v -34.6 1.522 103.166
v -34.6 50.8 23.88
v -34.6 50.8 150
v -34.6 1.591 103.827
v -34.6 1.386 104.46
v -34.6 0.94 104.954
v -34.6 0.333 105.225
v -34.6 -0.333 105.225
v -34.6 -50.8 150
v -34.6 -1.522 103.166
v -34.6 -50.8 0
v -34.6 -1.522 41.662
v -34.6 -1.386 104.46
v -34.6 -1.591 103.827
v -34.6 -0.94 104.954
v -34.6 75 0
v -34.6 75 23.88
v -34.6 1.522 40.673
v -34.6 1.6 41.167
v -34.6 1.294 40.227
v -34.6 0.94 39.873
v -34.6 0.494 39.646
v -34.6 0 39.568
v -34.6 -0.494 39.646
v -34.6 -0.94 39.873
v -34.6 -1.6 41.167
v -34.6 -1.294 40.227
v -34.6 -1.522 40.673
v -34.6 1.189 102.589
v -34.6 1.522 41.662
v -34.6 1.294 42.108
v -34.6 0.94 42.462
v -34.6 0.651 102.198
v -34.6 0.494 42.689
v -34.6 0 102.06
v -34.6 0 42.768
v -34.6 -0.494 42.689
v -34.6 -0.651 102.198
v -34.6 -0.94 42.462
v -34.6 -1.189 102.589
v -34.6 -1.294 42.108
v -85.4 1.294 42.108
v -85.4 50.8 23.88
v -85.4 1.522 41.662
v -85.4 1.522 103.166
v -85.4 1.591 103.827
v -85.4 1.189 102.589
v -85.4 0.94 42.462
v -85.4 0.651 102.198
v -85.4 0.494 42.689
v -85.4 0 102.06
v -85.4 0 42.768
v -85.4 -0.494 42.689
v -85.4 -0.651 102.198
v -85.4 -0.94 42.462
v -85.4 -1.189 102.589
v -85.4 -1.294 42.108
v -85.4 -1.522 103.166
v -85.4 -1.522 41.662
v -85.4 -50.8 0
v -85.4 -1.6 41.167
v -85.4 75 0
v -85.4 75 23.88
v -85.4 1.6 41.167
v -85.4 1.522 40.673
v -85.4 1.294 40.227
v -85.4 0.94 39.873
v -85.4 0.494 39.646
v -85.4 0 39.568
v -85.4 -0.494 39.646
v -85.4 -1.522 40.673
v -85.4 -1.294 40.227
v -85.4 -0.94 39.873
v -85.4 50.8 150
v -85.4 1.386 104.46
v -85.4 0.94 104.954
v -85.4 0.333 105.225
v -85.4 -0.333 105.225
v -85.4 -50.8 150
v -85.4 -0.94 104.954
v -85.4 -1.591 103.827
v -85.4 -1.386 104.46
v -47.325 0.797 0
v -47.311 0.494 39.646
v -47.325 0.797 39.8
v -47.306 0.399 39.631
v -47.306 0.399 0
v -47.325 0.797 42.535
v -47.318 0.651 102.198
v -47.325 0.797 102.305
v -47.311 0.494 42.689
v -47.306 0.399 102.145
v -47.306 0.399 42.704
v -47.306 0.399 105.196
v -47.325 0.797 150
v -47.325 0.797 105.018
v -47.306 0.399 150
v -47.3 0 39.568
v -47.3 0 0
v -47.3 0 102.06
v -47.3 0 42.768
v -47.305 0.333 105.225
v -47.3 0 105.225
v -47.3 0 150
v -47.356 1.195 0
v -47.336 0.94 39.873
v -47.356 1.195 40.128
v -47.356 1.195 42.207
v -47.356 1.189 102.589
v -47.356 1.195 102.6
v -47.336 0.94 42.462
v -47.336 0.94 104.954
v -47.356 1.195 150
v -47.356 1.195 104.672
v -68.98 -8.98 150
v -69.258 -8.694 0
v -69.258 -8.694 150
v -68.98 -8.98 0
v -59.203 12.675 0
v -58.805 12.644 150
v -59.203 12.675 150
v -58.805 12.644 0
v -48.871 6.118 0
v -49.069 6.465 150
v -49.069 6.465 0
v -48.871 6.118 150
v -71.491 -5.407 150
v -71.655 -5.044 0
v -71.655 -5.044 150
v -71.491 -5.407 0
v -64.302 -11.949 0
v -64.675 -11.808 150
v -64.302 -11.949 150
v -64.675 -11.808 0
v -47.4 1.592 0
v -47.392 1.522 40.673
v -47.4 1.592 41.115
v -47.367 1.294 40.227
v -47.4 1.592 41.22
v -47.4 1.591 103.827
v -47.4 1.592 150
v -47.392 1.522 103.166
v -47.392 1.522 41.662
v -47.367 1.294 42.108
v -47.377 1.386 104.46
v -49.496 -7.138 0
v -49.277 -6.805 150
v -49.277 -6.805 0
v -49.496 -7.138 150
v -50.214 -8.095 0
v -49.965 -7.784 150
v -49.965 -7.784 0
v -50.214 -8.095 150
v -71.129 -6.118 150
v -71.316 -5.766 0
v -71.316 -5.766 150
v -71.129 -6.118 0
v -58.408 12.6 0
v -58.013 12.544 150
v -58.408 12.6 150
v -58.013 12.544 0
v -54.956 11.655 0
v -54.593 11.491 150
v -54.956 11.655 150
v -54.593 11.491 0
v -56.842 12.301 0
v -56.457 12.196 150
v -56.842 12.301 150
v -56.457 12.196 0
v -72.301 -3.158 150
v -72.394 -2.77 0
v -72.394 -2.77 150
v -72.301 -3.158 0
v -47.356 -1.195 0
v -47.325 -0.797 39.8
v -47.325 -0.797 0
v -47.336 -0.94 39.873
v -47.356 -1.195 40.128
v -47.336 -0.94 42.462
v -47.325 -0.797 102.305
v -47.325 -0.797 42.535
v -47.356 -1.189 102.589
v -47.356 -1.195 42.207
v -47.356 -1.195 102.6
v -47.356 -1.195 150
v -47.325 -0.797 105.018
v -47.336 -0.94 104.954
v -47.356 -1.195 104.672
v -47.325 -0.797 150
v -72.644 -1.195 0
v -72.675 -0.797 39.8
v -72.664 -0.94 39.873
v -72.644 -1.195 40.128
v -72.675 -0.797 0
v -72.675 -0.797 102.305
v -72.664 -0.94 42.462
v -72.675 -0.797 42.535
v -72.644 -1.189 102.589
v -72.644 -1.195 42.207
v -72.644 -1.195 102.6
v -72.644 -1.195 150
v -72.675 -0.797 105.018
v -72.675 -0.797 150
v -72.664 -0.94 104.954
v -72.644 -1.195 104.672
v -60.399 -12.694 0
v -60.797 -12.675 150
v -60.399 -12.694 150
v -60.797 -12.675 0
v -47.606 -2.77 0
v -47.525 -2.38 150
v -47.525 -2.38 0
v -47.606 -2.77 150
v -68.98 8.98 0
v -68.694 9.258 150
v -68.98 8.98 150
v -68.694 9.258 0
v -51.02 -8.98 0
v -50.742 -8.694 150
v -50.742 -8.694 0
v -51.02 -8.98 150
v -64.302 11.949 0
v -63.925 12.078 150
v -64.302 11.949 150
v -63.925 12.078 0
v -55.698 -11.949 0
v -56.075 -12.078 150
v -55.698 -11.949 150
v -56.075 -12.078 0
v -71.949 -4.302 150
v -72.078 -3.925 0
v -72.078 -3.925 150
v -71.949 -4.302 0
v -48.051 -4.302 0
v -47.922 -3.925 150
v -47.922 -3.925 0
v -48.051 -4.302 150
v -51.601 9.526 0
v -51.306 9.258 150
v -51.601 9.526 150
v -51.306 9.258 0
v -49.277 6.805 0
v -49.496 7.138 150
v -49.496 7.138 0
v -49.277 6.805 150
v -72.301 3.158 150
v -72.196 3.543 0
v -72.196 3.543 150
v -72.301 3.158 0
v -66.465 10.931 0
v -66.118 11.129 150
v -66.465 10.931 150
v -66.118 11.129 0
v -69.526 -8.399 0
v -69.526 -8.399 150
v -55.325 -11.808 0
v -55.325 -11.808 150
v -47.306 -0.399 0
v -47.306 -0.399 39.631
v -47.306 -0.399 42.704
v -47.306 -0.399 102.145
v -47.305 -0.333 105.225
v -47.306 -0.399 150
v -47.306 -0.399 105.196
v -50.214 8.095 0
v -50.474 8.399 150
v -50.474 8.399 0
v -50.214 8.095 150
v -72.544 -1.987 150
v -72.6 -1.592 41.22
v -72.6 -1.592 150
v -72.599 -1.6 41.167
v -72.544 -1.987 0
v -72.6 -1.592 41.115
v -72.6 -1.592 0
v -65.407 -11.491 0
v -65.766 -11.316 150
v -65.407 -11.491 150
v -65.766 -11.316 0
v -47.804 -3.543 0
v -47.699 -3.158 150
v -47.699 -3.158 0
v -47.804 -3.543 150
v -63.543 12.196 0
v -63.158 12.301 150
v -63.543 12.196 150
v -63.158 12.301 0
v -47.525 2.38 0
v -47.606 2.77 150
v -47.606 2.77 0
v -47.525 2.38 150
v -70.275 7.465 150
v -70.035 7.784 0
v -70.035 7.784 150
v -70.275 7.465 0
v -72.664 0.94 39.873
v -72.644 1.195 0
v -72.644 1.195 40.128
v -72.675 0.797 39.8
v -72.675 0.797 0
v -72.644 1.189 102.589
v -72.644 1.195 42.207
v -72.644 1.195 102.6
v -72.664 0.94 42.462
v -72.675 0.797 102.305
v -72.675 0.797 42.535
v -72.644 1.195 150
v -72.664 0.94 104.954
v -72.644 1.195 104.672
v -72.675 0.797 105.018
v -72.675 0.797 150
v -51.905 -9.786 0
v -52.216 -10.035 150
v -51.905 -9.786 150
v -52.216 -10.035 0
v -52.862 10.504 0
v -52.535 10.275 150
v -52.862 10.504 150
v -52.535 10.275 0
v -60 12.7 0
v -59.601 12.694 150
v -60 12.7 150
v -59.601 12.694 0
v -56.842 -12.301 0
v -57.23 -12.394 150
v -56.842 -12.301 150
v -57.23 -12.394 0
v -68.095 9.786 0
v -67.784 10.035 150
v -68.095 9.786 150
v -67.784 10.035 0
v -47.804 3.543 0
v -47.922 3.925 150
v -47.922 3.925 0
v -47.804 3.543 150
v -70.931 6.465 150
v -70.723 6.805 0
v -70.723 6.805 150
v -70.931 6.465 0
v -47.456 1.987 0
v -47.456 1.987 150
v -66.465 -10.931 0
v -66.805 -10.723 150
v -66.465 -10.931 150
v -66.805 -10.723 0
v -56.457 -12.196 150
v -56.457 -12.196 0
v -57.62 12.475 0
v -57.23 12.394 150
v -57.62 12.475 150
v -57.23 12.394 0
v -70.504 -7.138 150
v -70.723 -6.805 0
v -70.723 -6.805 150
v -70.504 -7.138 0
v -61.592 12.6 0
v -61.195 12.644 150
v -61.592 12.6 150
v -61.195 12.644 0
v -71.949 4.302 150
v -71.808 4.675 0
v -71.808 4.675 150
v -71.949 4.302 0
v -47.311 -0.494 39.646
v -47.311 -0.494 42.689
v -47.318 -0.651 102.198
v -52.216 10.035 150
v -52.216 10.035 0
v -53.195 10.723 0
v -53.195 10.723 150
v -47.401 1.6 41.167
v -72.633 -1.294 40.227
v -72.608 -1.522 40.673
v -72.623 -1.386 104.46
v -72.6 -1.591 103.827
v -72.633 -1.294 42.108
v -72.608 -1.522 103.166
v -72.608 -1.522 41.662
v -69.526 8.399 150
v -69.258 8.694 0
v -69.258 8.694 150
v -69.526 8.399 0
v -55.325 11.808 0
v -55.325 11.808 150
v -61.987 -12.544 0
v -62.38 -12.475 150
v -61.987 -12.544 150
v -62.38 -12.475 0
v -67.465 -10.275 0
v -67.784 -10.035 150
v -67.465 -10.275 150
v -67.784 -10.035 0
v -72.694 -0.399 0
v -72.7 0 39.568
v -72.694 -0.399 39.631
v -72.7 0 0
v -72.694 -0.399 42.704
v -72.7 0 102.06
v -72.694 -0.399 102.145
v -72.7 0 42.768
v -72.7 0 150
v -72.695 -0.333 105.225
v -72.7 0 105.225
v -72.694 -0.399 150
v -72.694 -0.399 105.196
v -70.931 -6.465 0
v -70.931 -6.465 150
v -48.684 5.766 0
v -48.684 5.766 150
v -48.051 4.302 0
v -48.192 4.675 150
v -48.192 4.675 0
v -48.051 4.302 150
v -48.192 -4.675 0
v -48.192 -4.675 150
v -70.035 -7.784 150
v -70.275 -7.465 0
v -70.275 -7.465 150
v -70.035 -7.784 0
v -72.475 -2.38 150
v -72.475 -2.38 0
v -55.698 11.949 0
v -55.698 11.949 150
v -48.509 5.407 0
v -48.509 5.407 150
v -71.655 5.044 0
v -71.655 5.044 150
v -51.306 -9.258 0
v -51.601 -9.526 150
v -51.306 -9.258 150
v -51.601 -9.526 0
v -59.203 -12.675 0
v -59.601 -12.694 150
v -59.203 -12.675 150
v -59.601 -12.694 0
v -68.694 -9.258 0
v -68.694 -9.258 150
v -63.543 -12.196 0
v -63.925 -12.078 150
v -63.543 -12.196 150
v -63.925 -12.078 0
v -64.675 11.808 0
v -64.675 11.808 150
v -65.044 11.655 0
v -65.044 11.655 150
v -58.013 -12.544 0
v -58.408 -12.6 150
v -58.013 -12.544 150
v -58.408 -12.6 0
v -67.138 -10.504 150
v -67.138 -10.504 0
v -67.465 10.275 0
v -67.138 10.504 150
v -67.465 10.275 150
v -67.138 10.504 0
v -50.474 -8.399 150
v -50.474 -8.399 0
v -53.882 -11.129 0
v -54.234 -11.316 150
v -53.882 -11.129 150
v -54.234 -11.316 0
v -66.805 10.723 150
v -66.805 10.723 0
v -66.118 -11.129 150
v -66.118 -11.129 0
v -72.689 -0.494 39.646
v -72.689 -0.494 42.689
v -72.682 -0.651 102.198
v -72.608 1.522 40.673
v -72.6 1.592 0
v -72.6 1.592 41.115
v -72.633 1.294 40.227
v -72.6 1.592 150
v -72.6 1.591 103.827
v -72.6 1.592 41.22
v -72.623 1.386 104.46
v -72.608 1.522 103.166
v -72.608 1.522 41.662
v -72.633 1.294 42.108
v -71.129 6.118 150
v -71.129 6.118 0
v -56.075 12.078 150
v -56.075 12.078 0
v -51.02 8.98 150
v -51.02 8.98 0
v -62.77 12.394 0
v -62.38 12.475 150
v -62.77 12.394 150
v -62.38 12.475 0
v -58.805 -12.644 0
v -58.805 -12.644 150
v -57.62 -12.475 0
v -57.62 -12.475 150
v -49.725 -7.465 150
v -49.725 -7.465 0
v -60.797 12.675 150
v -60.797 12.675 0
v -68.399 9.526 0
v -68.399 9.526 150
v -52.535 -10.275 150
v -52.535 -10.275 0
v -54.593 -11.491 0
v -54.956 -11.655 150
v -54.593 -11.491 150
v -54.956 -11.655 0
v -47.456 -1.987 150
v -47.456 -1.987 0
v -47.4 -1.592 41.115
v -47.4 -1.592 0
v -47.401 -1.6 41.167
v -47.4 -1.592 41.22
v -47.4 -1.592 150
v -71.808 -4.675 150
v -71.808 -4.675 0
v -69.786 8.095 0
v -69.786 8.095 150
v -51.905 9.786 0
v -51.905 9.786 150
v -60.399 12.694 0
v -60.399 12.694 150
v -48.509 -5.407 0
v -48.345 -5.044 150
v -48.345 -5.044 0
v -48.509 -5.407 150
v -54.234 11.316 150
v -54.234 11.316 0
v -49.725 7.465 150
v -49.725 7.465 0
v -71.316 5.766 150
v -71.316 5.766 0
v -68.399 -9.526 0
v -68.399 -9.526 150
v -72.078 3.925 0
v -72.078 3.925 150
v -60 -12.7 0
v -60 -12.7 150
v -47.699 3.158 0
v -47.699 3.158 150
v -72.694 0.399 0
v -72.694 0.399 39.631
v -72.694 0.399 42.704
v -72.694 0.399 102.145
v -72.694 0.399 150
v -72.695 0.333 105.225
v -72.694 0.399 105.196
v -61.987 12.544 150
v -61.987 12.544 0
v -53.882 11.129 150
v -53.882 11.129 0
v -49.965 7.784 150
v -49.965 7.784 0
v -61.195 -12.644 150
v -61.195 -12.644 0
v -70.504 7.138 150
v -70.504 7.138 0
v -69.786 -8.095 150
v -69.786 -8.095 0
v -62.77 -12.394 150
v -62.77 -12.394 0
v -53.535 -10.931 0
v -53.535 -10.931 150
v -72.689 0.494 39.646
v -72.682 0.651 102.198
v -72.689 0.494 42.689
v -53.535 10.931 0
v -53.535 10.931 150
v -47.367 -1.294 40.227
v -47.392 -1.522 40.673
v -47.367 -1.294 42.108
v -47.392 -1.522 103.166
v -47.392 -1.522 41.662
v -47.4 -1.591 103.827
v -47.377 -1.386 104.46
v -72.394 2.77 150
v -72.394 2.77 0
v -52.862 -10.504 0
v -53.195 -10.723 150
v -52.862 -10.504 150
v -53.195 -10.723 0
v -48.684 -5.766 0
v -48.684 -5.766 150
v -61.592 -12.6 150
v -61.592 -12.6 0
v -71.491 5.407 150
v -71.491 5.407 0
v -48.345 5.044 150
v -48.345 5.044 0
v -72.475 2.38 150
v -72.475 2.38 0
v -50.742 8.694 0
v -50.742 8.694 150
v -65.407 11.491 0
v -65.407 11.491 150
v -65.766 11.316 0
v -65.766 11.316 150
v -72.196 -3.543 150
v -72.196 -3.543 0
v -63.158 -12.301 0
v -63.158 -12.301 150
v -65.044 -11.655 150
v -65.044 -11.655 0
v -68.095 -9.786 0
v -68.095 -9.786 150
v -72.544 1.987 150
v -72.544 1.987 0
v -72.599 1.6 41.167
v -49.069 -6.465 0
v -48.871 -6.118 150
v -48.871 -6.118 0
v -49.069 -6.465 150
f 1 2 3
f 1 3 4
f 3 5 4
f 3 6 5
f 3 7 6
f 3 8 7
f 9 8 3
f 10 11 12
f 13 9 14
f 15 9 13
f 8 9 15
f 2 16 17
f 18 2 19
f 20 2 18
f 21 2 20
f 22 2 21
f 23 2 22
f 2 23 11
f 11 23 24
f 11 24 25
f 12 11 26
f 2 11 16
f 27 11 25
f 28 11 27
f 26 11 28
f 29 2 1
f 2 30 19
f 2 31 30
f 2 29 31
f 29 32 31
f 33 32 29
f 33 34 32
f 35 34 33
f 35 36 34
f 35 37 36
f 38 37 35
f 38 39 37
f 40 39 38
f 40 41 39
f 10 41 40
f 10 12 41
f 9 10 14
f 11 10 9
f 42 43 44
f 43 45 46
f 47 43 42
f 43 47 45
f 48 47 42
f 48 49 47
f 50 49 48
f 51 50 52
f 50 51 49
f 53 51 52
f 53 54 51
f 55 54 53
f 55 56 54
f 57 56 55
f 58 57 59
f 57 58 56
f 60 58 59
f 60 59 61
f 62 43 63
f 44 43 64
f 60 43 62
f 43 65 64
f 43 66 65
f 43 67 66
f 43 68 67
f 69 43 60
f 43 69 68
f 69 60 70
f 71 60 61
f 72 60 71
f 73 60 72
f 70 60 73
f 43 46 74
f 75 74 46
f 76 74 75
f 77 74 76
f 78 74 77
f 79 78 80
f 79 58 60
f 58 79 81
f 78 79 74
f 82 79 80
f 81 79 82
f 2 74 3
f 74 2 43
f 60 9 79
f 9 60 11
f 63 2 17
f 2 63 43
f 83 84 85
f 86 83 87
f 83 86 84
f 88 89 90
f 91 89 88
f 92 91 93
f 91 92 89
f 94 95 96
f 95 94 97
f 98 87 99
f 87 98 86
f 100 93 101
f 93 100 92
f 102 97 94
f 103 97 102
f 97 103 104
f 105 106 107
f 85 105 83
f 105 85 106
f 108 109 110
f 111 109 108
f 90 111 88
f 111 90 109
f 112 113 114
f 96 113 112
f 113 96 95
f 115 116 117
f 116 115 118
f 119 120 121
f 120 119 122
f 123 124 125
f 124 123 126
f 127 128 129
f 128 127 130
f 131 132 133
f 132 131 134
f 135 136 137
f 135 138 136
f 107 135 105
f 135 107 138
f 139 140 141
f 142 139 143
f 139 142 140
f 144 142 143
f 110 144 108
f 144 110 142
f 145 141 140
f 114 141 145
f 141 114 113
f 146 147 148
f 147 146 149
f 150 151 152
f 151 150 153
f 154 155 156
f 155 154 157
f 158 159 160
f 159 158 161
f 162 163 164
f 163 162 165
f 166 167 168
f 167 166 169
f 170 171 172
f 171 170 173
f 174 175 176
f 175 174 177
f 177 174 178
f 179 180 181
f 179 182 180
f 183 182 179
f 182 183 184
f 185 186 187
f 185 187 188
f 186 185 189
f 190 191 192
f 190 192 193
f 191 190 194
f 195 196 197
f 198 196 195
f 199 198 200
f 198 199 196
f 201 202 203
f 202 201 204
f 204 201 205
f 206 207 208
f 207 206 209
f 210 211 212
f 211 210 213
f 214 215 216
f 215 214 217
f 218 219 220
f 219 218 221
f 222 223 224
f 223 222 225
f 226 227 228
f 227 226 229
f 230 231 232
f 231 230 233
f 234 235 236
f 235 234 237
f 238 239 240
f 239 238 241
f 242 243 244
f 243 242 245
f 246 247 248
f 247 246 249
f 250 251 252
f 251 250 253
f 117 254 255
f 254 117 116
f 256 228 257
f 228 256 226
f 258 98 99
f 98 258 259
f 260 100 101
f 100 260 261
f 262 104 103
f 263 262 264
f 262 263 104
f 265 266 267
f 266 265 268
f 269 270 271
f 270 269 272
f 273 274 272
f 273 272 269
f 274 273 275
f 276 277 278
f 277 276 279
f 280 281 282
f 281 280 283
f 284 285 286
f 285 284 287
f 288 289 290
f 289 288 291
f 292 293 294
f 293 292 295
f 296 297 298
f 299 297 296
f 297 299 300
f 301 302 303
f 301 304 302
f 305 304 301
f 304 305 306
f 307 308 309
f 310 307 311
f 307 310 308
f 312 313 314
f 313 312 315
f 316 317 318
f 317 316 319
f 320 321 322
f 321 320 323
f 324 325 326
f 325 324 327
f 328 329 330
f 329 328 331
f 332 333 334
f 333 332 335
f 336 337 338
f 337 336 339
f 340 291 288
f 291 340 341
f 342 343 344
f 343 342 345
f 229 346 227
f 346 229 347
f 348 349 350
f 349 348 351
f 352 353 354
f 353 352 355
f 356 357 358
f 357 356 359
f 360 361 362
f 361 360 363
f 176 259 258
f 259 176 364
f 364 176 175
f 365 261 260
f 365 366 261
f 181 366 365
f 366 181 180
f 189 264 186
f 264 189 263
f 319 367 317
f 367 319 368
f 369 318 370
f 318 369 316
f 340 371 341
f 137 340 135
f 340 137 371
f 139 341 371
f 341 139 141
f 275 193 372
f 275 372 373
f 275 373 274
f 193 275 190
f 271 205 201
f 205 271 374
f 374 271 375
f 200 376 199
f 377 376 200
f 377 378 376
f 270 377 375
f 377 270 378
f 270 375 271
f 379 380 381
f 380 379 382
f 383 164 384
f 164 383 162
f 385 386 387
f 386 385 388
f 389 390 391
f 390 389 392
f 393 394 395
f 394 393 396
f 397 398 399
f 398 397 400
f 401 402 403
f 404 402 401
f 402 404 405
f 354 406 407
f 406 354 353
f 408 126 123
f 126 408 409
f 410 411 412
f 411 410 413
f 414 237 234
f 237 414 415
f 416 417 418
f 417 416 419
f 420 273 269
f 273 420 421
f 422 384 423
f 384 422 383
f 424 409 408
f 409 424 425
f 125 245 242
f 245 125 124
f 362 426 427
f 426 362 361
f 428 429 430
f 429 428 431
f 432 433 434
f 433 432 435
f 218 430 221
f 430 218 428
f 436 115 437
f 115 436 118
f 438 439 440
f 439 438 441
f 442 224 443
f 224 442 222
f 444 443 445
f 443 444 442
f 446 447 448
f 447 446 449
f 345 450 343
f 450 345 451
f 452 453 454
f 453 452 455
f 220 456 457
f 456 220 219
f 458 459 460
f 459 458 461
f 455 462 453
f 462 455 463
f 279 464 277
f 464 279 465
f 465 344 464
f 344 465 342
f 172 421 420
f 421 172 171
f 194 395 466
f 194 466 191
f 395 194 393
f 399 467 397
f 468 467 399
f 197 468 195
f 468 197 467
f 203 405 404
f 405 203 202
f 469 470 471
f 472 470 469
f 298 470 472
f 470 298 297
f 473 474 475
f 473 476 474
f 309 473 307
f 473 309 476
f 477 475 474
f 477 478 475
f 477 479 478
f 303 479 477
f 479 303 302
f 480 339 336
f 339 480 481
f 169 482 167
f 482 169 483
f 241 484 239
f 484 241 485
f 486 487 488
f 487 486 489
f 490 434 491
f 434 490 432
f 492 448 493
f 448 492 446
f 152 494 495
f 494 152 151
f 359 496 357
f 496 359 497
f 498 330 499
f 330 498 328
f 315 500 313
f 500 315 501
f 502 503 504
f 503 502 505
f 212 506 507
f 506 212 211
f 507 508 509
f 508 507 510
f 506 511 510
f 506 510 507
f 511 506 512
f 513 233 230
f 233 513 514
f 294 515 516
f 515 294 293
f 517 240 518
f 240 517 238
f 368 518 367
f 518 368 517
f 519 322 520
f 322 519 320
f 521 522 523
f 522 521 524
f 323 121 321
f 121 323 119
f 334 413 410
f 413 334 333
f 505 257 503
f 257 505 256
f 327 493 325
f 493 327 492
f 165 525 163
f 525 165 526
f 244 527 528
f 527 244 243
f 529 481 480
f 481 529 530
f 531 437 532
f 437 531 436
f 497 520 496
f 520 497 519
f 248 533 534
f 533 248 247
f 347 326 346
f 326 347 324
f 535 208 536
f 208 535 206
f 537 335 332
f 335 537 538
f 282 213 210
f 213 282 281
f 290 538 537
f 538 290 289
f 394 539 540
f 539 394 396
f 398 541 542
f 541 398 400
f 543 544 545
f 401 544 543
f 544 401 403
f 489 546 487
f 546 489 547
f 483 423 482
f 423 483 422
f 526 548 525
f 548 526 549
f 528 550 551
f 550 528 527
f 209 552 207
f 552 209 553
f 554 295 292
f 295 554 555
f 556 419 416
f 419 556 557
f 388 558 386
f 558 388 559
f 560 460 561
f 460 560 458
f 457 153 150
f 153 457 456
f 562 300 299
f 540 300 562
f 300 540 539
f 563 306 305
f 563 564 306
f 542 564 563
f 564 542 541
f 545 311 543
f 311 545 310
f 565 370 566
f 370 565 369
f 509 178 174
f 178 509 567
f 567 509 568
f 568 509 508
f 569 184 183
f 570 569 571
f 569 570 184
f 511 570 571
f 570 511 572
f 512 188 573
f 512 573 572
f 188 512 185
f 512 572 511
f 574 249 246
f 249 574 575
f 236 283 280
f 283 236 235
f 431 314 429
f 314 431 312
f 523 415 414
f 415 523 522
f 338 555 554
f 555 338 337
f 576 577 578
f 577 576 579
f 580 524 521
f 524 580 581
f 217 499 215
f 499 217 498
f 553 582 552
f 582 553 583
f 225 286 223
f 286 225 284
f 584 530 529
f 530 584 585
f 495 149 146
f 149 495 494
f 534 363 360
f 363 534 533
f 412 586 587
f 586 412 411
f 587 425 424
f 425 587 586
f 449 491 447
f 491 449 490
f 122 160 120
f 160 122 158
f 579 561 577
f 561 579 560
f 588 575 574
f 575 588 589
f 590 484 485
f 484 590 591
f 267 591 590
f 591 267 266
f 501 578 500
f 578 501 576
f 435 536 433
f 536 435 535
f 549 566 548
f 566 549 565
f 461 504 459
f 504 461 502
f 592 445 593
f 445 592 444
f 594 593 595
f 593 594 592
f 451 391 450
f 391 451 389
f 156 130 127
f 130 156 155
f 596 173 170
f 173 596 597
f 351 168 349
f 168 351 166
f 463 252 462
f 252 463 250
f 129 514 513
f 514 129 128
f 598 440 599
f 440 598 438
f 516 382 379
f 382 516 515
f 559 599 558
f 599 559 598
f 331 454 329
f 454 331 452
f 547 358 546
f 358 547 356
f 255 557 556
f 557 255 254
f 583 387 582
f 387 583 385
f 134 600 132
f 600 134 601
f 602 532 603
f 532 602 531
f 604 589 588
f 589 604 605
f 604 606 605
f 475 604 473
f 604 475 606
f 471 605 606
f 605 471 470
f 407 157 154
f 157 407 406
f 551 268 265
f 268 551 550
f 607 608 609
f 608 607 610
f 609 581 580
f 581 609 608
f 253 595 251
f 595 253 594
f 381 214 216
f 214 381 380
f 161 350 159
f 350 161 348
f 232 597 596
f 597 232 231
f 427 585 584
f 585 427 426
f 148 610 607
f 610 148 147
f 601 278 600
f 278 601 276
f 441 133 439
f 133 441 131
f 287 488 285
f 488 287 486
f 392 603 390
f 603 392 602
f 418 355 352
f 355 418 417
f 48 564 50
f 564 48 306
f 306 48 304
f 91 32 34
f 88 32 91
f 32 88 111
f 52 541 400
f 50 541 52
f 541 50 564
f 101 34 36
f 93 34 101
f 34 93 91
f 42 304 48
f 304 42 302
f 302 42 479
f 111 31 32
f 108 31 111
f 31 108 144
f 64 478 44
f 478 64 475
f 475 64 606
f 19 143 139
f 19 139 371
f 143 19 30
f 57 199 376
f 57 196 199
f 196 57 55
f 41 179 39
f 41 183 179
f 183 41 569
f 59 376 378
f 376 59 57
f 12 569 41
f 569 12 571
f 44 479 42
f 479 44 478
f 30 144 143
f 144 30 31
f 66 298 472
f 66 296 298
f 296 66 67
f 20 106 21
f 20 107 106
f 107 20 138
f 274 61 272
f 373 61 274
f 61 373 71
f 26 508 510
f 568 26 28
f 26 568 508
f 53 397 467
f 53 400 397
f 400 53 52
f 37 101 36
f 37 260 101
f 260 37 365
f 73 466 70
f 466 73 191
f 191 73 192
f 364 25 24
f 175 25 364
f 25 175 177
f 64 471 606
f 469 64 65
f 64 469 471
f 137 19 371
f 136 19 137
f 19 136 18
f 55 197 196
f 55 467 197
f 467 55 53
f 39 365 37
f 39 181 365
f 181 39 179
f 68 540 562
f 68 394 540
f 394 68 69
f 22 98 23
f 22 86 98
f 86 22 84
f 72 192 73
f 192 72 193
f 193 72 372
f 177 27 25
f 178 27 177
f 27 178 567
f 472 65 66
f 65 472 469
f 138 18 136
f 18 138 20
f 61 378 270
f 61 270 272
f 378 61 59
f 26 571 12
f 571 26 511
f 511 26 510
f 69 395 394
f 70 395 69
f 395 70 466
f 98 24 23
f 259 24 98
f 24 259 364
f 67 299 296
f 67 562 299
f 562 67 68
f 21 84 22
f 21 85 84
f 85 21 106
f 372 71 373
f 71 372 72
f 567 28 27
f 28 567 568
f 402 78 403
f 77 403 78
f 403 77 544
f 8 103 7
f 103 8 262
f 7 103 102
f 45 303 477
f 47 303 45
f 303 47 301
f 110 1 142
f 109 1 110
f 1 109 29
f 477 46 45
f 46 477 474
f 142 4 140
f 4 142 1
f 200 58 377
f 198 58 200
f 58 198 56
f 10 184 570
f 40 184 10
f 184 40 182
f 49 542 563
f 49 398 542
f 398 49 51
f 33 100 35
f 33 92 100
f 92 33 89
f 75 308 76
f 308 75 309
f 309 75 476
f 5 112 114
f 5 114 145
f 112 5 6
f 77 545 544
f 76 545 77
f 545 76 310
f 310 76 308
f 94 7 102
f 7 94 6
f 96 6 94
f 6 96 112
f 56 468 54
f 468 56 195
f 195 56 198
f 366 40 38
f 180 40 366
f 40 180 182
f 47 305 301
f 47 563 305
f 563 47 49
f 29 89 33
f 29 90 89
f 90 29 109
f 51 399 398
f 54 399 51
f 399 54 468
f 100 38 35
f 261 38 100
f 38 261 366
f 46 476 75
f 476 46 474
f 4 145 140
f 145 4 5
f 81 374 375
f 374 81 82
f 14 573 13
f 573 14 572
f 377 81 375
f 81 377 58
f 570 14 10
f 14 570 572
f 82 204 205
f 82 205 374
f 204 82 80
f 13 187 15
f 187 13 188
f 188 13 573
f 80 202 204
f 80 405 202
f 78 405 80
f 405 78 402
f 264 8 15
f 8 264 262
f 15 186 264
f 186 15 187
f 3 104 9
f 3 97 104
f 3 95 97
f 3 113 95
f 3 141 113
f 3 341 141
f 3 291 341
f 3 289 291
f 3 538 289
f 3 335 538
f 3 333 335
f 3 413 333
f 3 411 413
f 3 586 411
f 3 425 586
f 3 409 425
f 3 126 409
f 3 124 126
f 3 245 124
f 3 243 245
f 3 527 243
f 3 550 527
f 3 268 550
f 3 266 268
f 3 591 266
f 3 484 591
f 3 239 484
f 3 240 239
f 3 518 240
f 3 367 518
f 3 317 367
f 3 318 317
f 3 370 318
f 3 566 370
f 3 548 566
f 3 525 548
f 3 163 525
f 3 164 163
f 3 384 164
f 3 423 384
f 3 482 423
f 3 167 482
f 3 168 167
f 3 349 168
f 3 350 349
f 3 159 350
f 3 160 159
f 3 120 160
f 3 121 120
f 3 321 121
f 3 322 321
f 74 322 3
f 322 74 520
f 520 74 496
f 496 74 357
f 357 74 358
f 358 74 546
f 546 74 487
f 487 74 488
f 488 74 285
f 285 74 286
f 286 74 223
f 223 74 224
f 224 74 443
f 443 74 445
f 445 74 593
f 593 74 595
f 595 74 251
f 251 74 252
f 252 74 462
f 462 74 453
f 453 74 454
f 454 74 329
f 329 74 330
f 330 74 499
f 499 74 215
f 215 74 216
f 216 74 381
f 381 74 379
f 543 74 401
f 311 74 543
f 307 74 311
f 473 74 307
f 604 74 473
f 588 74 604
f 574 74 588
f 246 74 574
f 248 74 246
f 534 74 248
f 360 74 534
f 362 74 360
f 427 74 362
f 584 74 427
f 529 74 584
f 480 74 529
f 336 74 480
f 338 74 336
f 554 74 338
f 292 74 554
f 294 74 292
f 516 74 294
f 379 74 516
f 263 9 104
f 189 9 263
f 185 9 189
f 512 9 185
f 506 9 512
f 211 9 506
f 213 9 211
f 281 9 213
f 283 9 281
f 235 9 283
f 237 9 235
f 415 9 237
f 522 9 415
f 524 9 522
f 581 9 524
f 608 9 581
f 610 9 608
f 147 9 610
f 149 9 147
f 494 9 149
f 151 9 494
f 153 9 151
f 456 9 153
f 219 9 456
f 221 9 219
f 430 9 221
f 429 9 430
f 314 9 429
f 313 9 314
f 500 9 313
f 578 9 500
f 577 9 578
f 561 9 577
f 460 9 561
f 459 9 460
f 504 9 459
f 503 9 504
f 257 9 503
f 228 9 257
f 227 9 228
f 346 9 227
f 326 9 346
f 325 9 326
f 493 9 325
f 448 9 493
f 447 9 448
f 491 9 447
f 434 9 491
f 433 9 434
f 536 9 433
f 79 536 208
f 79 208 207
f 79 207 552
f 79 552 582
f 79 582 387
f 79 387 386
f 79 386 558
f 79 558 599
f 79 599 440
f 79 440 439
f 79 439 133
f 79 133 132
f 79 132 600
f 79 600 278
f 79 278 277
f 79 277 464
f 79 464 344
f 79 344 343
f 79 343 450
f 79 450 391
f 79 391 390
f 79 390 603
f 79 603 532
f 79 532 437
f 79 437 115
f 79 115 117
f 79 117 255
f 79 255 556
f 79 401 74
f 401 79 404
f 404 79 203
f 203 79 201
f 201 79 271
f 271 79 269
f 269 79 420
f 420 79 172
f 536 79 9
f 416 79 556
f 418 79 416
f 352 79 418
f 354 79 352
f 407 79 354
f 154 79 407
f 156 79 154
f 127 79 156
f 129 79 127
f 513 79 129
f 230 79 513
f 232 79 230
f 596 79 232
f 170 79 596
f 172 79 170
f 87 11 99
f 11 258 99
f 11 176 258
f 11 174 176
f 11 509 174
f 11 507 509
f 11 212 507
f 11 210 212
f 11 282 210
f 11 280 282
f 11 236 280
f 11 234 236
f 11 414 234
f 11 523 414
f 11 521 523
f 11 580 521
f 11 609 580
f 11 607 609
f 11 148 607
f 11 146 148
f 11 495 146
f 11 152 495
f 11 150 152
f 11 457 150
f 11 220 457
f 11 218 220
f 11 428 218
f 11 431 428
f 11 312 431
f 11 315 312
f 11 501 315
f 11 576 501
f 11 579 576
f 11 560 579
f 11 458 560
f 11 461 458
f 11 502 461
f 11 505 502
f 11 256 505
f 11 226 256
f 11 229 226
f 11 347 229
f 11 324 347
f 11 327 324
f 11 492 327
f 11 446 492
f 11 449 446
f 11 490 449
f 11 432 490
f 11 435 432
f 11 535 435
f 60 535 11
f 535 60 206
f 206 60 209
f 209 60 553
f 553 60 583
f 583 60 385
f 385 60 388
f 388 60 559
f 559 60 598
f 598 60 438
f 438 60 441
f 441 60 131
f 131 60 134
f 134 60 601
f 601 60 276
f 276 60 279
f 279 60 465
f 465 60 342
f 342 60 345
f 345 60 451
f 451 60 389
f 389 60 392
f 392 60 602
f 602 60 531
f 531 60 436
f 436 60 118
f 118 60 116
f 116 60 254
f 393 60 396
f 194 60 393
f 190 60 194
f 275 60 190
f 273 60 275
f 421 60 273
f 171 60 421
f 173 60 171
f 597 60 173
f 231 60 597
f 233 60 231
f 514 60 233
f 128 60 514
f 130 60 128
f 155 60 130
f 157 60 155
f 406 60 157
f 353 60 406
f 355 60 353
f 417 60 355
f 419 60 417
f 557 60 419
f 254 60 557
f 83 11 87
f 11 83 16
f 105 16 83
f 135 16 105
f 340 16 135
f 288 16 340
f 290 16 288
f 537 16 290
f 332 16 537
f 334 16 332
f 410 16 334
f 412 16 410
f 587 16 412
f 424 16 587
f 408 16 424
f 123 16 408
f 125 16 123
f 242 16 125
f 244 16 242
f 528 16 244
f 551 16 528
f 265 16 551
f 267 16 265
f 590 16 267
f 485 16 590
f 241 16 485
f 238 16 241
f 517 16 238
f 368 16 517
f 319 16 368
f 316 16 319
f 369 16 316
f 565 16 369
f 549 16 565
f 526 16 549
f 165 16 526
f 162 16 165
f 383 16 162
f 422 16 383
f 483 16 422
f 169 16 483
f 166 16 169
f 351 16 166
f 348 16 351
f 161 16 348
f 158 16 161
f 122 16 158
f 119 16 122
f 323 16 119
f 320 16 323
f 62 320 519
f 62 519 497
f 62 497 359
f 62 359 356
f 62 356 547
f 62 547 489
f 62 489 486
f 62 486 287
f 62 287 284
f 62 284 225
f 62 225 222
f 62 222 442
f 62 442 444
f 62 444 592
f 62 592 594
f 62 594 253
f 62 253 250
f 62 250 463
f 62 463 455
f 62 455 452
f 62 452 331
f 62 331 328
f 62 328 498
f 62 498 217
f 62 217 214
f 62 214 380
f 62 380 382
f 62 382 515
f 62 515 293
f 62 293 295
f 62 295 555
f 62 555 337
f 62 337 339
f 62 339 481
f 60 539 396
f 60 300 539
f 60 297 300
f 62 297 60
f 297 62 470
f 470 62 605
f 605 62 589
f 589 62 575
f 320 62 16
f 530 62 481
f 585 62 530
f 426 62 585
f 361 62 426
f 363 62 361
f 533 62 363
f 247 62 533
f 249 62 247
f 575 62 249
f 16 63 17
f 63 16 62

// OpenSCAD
include <../../Parameters.scad>
use <888_1014.scad>

draft = false;


translate([-60,0,-300])
        888_1014_part(2, draft);
/*
translate([0,-85,0])
    rotate([0,0,90])
        translate([0,0,-450])
                888_1014_part(3, draft);
*/
